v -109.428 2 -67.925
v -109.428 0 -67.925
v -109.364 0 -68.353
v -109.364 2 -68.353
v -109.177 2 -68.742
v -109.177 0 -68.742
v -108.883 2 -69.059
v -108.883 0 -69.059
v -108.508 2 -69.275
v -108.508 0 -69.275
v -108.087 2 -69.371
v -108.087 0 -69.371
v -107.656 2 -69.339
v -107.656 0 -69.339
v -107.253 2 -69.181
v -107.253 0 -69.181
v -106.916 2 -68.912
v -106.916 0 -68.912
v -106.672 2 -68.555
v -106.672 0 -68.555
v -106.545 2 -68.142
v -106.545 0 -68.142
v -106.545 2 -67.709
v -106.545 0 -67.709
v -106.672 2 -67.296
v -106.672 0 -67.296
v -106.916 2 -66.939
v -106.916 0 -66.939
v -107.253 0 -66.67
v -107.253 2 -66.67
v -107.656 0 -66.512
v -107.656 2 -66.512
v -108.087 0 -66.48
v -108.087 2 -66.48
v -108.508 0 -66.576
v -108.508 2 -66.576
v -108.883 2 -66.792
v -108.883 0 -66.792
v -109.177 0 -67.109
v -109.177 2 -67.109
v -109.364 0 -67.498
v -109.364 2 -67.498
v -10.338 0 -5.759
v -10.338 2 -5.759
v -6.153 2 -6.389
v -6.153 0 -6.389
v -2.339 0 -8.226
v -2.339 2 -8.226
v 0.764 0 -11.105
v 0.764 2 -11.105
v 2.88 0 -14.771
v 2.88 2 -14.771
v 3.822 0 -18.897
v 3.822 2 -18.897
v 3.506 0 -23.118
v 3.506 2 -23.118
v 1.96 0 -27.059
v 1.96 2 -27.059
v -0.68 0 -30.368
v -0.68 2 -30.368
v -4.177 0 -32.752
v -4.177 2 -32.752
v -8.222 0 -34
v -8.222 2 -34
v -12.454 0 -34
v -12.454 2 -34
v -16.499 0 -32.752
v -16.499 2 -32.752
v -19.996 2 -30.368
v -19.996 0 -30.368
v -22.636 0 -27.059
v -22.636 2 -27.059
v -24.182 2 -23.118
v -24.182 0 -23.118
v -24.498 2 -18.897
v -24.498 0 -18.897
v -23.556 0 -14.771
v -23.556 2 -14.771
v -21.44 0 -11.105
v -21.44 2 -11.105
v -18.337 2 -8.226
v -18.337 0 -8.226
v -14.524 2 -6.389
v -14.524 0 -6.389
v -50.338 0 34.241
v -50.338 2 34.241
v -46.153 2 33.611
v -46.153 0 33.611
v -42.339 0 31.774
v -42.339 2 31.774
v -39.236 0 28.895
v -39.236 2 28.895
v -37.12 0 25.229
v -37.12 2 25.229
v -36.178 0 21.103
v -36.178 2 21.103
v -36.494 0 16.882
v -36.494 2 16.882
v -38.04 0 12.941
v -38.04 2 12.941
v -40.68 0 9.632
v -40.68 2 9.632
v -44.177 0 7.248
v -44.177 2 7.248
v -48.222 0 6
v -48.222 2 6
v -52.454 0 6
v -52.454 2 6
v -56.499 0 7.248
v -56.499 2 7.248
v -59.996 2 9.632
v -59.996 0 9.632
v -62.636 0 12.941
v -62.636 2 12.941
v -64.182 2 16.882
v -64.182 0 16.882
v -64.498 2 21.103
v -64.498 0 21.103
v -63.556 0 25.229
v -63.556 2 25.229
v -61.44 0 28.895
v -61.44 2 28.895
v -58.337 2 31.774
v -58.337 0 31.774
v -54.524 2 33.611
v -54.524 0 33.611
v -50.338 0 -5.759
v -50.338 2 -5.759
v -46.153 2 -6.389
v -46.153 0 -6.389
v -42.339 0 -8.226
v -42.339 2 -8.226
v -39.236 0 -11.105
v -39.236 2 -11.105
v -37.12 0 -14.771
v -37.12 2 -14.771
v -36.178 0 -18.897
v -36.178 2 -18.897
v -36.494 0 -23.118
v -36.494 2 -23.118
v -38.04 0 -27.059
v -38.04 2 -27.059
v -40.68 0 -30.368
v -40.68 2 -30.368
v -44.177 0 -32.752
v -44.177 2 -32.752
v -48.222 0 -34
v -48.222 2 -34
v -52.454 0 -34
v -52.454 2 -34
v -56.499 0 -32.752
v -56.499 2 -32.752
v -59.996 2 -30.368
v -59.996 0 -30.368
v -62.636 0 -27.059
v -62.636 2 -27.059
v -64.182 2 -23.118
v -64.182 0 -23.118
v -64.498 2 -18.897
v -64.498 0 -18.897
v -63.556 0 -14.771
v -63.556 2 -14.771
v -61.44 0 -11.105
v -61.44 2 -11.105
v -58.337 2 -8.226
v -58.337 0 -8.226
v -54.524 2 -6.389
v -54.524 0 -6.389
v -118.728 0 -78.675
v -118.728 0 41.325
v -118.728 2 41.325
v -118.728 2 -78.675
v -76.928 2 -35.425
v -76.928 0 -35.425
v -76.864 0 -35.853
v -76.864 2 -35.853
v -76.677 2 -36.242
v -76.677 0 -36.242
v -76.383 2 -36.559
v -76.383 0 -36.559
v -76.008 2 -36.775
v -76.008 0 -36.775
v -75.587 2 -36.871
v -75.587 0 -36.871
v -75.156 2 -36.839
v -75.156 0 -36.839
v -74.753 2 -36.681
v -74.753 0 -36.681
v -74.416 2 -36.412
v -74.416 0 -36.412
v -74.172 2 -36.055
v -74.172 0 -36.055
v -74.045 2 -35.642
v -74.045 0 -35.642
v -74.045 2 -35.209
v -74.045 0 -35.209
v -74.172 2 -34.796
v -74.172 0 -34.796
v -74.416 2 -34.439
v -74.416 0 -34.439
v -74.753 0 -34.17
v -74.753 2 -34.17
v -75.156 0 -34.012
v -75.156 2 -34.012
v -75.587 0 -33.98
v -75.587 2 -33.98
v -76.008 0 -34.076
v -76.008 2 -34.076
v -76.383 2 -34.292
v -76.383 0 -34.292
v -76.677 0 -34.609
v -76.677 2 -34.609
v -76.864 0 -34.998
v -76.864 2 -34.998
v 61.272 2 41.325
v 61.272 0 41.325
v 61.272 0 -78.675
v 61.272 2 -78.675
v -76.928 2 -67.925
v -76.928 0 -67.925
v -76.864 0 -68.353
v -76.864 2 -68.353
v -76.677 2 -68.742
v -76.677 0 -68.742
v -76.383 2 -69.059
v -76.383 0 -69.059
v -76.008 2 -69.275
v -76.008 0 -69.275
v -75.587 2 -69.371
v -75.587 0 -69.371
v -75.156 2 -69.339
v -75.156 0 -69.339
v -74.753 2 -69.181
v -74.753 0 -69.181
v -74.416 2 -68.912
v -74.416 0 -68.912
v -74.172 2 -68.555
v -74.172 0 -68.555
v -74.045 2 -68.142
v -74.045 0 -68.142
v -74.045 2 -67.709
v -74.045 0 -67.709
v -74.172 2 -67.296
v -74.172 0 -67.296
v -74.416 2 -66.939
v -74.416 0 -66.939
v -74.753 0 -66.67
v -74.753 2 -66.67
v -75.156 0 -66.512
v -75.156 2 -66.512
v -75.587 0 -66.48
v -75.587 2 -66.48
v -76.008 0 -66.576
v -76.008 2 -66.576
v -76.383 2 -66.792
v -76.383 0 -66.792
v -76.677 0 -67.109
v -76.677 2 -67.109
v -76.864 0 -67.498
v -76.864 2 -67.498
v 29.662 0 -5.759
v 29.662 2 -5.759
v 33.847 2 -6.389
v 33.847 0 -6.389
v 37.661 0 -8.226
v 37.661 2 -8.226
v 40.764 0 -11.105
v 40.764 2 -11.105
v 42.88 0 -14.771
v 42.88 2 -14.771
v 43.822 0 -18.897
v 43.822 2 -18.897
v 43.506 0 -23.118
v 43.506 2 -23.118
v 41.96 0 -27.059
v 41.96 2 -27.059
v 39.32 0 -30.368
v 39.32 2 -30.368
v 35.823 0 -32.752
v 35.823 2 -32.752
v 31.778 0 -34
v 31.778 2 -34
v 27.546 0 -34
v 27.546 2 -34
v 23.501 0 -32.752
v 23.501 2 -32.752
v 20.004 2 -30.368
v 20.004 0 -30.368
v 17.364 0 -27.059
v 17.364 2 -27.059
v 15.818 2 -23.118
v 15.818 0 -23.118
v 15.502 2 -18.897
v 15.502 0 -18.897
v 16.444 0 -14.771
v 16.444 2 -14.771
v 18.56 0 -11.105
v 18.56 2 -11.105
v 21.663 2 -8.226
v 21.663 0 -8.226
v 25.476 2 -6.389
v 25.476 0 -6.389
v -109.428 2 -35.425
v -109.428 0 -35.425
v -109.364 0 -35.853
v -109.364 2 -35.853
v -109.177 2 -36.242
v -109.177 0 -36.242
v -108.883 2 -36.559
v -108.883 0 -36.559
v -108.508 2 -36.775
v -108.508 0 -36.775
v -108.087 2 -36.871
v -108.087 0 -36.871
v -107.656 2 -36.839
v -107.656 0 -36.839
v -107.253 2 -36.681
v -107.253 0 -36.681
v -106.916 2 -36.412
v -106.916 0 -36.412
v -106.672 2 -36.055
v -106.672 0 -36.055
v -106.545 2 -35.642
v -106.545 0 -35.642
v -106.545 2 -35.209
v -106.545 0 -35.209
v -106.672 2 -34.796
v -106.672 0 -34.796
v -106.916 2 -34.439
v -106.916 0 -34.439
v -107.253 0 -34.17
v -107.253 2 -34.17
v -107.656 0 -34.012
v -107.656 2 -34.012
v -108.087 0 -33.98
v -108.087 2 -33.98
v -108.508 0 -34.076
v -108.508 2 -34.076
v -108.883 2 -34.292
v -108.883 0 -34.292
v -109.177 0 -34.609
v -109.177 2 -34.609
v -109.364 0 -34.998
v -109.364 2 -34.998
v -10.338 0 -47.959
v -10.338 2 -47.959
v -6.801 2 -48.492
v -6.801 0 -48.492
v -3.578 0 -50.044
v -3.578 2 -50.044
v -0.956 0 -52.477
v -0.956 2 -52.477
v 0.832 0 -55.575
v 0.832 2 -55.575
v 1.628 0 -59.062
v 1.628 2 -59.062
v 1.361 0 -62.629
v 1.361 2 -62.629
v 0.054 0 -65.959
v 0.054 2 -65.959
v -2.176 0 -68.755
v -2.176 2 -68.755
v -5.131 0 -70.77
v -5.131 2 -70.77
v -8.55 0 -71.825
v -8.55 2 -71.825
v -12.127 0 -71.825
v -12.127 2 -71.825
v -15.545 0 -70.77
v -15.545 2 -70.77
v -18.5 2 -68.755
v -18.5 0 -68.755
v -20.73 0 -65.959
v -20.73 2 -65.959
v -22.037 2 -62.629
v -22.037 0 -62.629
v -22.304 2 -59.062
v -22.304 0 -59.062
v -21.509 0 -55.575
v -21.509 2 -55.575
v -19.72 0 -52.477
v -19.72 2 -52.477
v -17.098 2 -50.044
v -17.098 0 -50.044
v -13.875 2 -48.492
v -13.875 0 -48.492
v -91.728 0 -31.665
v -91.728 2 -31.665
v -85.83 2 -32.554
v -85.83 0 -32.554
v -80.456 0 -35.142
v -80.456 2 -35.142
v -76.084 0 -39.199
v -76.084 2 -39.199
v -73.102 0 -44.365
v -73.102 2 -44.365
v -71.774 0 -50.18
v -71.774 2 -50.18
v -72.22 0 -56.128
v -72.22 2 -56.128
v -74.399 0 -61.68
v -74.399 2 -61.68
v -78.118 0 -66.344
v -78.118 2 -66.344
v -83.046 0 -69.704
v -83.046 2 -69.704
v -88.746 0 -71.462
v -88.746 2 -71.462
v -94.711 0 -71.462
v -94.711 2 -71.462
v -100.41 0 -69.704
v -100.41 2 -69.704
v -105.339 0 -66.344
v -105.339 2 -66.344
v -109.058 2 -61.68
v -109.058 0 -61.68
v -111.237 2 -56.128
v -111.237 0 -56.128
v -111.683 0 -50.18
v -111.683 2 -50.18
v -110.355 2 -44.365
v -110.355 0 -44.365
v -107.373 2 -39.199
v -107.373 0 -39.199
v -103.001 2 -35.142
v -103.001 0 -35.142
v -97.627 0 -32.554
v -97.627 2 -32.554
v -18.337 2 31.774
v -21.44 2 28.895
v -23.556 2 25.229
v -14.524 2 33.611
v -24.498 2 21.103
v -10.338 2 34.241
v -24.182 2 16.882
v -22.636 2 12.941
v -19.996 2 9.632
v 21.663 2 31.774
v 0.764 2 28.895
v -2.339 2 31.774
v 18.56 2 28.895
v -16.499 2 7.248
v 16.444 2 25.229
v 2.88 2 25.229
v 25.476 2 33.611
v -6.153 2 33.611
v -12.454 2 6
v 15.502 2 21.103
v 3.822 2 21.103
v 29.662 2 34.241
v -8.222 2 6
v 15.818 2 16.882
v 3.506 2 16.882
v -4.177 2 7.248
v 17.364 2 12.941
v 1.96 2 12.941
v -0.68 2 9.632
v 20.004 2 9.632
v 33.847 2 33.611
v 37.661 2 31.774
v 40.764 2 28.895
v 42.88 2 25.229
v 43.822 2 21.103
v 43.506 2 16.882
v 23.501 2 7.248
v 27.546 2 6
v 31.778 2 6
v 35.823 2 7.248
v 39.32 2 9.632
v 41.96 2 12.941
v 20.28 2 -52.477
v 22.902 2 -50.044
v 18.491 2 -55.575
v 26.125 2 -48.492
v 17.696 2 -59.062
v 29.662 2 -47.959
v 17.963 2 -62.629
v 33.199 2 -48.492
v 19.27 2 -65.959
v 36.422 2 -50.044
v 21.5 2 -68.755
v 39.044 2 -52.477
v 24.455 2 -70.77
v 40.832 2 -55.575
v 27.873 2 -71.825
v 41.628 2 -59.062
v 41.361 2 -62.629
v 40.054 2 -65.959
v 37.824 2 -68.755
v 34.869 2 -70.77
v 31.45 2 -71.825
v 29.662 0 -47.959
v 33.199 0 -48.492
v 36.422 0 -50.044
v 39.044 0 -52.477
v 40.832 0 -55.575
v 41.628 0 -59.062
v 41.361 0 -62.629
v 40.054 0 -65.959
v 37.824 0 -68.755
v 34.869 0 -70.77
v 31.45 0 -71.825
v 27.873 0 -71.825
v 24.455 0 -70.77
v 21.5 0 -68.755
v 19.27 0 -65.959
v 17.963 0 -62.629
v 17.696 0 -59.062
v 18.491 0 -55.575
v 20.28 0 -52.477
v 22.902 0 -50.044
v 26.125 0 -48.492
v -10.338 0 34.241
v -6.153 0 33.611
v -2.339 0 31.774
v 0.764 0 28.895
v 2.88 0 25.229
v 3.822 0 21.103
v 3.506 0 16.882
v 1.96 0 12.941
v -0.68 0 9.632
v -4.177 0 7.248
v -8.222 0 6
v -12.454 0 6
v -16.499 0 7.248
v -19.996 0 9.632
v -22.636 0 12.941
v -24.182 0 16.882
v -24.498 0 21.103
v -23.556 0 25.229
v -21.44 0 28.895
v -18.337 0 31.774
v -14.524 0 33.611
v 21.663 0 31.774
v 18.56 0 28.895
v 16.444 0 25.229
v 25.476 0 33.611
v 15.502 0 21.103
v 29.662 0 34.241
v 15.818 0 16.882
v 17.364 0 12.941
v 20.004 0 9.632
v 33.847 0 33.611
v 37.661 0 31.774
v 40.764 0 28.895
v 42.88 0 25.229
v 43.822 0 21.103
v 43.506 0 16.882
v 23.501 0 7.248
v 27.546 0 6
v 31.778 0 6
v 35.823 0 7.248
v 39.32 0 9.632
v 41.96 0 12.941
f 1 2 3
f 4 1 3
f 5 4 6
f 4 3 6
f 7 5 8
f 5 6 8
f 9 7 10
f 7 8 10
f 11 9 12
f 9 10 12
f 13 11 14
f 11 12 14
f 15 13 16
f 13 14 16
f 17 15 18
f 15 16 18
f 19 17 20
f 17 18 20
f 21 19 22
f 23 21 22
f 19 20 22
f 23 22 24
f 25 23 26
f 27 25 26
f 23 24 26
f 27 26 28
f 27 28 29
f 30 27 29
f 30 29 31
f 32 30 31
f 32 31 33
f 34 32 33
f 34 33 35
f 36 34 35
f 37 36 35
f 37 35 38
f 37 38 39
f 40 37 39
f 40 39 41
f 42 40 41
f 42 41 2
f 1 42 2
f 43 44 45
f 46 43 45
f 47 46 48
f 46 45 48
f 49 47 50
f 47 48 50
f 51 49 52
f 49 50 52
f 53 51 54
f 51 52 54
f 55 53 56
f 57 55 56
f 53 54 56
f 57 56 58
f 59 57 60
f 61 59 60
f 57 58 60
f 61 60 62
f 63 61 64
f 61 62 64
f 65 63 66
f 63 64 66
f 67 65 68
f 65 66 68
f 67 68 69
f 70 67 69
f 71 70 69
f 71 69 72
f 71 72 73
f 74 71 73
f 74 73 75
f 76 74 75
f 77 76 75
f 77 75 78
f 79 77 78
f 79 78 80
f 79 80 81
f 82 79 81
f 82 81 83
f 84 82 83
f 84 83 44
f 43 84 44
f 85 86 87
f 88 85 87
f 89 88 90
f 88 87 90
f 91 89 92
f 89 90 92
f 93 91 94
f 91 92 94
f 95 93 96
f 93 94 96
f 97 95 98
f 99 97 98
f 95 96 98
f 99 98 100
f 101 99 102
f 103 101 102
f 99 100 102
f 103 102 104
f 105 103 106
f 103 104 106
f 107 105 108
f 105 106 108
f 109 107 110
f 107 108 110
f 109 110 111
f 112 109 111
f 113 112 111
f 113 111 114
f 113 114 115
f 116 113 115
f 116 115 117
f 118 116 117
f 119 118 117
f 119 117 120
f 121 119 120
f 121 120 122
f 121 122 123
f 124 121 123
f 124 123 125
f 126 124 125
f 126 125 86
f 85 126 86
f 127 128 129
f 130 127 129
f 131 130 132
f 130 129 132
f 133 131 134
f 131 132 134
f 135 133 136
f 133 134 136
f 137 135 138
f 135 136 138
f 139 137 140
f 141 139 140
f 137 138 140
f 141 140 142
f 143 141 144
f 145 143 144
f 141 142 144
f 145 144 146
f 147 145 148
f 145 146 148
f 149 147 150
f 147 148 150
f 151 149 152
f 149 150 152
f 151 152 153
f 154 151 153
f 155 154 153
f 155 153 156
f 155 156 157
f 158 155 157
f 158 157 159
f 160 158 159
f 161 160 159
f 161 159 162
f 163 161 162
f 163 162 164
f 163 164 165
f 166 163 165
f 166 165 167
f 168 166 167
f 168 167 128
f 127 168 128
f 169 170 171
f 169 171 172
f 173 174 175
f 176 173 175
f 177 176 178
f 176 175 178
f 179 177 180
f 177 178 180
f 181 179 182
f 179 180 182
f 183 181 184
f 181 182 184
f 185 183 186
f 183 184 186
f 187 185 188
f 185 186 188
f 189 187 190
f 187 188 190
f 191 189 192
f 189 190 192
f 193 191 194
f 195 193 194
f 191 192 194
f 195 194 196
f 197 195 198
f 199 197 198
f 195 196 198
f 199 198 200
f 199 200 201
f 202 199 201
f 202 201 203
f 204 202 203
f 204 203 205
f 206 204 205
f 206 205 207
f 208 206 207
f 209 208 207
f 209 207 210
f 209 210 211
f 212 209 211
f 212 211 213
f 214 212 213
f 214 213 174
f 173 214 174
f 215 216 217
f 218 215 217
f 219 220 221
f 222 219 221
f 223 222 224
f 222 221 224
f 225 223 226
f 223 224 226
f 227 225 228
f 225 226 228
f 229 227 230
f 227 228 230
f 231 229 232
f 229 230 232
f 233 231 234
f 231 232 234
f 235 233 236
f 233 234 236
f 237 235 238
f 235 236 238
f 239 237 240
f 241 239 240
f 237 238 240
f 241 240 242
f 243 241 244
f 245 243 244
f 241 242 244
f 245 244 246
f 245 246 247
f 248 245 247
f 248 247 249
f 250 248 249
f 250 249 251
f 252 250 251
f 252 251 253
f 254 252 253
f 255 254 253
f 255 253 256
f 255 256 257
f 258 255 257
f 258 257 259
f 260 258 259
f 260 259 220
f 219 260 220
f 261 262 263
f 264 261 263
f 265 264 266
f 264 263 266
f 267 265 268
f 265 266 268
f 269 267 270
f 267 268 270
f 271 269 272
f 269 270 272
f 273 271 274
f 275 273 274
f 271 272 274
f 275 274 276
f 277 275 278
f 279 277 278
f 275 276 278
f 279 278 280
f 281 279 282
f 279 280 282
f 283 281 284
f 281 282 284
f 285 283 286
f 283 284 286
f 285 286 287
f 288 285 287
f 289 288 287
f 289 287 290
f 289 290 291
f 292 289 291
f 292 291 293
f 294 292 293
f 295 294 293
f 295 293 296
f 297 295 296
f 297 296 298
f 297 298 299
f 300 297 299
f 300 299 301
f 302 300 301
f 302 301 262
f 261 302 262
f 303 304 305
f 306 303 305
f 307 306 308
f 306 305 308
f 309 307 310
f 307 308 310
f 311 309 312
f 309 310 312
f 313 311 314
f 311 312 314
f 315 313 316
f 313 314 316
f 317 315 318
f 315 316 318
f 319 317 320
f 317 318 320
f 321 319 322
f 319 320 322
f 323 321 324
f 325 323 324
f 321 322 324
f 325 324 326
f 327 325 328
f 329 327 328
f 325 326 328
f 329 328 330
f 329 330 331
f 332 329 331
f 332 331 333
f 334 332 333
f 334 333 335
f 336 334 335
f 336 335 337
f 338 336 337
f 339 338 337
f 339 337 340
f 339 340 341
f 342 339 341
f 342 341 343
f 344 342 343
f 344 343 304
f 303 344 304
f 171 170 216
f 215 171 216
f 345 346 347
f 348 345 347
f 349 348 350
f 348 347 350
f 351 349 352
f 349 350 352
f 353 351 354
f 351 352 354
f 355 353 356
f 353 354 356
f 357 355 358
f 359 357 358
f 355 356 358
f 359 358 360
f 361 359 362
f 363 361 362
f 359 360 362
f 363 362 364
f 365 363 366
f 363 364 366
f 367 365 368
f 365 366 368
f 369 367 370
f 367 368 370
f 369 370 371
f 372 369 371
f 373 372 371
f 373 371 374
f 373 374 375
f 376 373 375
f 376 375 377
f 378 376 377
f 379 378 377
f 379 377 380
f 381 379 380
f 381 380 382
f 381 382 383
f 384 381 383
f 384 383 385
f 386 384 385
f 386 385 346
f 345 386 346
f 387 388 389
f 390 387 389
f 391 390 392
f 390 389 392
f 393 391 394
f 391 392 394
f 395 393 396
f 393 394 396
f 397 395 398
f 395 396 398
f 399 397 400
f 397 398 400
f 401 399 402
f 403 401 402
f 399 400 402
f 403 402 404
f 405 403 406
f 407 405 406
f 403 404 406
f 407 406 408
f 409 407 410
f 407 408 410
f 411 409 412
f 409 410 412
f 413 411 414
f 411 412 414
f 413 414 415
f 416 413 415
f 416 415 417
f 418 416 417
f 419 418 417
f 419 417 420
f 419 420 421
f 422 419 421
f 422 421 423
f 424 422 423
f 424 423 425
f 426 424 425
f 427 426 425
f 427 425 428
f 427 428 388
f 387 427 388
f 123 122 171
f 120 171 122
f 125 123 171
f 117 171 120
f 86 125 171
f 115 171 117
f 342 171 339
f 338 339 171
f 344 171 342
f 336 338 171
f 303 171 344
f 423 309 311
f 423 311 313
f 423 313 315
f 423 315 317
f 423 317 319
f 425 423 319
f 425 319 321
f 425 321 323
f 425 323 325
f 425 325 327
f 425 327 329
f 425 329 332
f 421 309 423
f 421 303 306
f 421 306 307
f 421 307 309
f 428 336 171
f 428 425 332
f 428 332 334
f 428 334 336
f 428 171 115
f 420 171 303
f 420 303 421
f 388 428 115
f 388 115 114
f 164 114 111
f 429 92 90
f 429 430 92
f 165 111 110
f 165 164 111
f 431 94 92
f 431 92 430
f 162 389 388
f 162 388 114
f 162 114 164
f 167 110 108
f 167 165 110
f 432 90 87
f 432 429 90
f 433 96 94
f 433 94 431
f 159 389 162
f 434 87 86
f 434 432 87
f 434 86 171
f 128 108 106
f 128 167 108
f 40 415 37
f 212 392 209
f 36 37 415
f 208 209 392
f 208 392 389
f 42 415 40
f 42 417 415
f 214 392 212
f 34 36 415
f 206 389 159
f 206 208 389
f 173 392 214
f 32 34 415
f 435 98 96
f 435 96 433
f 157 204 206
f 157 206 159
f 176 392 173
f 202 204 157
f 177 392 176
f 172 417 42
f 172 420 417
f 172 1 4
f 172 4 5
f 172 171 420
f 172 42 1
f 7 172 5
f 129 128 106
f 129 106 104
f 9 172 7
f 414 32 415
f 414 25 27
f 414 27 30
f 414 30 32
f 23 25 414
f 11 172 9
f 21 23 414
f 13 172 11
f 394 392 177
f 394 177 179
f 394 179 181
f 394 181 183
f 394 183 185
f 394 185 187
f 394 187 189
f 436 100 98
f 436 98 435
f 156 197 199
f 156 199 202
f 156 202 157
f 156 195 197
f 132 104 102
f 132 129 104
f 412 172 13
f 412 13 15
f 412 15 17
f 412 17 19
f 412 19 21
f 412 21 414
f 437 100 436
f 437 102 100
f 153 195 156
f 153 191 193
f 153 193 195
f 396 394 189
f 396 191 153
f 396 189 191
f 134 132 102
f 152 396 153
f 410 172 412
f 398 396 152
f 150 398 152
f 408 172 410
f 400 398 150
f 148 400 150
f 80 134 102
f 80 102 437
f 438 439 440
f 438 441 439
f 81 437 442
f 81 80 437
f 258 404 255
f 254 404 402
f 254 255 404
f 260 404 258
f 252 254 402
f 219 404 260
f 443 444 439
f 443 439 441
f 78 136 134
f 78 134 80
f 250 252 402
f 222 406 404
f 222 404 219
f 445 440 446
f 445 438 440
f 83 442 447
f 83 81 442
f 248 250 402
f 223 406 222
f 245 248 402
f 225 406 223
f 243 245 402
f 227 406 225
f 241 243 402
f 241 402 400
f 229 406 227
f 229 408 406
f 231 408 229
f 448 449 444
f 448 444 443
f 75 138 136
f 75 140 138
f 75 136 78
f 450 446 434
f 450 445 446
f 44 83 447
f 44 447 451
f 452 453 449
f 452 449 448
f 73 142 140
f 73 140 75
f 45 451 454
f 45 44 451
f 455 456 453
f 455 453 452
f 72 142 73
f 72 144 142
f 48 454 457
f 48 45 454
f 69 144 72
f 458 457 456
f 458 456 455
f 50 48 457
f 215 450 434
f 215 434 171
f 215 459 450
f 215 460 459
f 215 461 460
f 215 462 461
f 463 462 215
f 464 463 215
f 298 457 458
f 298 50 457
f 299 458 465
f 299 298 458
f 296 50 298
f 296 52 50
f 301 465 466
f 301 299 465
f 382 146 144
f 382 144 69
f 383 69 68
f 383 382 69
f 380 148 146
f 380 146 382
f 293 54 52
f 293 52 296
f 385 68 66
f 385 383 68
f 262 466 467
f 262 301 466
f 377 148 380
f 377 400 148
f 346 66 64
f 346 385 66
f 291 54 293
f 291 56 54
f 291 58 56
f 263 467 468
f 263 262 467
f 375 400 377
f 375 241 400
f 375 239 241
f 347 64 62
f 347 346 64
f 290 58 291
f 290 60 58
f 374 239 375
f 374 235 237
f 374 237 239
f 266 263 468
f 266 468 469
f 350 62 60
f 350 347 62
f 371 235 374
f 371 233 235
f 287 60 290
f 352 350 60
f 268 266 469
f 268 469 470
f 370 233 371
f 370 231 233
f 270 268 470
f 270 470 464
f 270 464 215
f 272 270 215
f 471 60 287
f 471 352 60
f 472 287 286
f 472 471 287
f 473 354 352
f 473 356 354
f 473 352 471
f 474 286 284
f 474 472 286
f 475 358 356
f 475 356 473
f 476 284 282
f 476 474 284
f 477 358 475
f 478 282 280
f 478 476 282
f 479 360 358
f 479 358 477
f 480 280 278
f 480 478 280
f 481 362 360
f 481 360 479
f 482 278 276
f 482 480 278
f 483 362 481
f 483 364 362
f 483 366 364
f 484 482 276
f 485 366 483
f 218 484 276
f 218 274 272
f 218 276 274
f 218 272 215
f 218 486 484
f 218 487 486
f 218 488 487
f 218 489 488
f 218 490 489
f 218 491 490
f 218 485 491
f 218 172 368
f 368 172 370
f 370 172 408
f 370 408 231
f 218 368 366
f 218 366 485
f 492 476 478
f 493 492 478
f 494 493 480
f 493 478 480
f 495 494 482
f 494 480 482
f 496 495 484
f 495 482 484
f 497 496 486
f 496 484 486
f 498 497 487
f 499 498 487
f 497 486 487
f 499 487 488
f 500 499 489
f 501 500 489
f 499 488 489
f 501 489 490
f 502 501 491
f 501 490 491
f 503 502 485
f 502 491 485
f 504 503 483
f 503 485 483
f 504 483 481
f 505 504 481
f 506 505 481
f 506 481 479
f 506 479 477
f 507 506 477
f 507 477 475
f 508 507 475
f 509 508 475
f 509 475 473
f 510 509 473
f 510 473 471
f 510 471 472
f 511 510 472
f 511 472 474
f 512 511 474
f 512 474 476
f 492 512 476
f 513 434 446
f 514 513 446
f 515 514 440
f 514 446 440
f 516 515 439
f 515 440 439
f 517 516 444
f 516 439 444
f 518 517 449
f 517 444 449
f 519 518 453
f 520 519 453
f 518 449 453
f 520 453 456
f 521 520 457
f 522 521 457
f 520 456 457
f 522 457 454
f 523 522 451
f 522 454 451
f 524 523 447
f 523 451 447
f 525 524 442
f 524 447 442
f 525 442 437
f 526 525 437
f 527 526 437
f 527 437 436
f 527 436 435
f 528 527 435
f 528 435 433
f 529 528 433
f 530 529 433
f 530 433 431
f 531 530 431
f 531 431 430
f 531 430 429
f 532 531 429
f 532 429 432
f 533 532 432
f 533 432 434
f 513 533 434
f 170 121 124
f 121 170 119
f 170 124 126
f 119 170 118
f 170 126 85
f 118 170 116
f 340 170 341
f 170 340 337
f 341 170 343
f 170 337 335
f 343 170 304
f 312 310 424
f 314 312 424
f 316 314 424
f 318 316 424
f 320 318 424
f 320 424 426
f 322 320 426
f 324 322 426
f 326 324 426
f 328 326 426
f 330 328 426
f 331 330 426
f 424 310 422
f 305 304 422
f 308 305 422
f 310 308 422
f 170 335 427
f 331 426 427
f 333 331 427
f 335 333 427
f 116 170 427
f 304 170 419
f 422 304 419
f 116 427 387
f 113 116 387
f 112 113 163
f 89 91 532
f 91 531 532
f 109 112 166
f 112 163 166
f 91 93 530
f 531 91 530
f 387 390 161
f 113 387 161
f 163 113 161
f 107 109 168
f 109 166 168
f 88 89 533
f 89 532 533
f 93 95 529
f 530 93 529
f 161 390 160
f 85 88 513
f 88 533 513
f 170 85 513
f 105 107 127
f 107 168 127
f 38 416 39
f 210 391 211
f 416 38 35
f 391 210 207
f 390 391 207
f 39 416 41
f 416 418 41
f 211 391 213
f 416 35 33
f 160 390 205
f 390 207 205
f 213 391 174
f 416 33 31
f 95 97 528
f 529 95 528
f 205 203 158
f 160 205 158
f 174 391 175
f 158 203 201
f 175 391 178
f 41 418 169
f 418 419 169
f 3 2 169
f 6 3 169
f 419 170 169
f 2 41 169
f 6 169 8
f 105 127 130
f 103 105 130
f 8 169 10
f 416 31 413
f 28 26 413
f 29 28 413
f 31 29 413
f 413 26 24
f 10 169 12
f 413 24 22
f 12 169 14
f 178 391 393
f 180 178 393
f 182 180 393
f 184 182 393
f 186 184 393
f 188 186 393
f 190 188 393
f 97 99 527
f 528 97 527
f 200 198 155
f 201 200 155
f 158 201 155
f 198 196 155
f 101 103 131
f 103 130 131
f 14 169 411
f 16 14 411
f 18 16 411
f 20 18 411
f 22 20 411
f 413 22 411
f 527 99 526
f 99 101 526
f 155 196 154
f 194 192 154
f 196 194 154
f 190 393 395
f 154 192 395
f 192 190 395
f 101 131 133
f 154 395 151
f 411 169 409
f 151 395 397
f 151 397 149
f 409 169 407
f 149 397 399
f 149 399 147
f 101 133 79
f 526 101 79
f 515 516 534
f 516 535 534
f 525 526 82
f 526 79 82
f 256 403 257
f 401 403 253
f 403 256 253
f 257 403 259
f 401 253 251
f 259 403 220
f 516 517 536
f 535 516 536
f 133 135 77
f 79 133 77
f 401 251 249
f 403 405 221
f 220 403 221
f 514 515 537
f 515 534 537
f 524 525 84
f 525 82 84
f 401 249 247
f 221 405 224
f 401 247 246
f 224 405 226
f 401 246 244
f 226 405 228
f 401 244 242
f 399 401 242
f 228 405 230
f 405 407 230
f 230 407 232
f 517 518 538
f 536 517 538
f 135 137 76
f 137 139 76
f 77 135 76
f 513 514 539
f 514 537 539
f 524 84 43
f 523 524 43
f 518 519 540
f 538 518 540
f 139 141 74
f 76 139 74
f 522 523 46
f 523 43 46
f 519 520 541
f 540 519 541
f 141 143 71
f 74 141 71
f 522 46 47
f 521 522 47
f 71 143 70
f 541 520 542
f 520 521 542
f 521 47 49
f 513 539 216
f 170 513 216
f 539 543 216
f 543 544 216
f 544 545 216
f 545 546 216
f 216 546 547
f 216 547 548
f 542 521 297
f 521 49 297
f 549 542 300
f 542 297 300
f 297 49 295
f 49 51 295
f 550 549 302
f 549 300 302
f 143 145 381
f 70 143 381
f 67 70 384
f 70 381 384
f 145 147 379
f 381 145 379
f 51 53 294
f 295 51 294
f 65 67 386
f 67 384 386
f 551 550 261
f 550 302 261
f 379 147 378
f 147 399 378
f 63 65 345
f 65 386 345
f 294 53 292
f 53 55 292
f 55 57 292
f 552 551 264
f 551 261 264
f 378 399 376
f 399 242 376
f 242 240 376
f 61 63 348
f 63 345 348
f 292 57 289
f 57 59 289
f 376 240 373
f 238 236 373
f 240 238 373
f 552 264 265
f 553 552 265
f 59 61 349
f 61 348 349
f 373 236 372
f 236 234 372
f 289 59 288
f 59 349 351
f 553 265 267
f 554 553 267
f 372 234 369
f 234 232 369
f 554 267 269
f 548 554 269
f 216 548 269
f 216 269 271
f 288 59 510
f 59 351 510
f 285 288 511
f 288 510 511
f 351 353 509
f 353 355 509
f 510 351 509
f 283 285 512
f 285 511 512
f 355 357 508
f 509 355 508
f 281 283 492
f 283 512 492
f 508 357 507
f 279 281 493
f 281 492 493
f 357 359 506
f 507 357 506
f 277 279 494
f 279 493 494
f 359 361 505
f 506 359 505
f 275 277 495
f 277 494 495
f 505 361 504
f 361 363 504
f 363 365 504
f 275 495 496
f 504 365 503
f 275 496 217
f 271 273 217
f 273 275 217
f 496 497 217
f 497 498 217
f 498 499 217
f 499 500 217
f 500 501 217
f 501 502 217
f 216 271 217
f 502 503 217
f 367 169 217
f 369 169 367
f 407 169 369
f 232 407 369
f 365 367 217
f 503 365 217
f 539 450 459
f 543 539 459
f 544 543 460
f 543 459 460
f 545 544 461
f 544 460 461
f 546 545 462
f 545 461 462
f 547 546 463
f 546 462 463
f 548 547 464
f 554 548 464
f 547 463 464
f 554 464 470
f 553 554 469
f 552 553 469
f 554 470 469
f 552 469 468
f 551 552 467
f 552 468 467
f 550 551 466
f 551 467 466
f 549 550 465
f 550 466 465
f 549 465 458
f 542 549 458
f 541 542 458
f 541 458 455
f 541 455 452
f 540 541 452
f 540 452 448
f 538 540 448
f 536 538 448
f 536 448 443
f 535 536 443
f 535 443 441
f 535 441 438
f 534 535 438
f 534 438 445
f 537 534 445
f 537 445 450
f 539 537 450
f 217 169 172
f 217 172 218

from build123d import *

# Parameters (mm, degrees)
SKETCH1_W              = 180
SKETCH1_H              = 120
BOSS_EXTRUDE1_DEPTH    = 2
BUTTON_HOLES_CUT_REACH = 144.444
SKETCH2_R              = 14.2
SKETCH2_R_2            = 12
SKETCH2_R_3            = 20.01
M2_5_CLEARANCE_HOLE1_D = 2.9


with BuildPart() as part:
    # Sketch1 → Boss-Extrude1 (new body)
    with BuildSketch(Plane(origin=(0, 0, 0), x_dir=(1, 0, 0), z_dir=(0, 1, 0))):
        with Locations((-28.728476821, 18.675496689)):
            Rectangle(SKETCH1_W, SKETCH1_H)
    extrude(amount=BOSS_EXTRUDE1_DEPTH)

    # Sketch2 → button_holes_cut (cut, up to next)
    with BuildSketch(Plane(origin=(0, 2, 0), x_dir=(1, 0, 0), z_dir=(0, 1, 0)), mode=Mode.PRIVATE) as button_holes_cut_sk1:
        with Locations(Location((-50.338026535, -20.041382951, 0), (0, 0, 270))):
            Circle(SKETCH2_R)
    button_holes_cut_tool1 = extrude(button_holes_cut_sk1.sketch, amount=-BUTTON_HOLES_CUT_REACH, mode=Mode.PRIVATE) & part.part
    # Sketch2 → button_holes_cut (cut, up to next)
    with BuildSketch(Plane(origin=(0, 2, 0), x_dir=(1, 0, 0), z_dir=(0, 1, 0)), mode=Mode.PRIVATE) as button_holes_cut_sk2:
        with Locations(Location((29.661973465, 59.958617049, 0), (0, 0, 270))):
            Circle(SKETCH2_R_2)
    button_holes_cut_tool2 = extrude(button_holes_cut_sk2.sketch, amount=-BUTTON_HOLES_CUT_REACH, mode=Mode.PRIVATE) & part.part
    # Sketch2 → button_holes_cut (cut, up to next)
    with BuildSketch(Plane(origin=(0, 2, 0), x_dir=(1, 0, 0), z_dir=(0, 1, 0)), mode=Mode.PRIVATE) as button_holes_cut_sk3:
        with Locations(Location((-10.338026535, 59.958617049, 0), (0, 0, 270))):
            Circle(SKETCH2_R_2)
    button_holes_cut_tool3 = extrude(button_holes_cut_sk3.sketch, amount=-BUTTON_HOLES_CUT_REACH, mode=Mode.PRIVATE) & part.part
    # Sketch2 → button_holes_cut (cut, up to next)
    with BuildSketch(Plane(origin=(0, 2, 0), x_dir=(1, 0, 0), z_dir=(0, 1, 0)), mode=Mode.PRIVATE) as button_holes_cut_sk4:
        with Locations(Location((-10.338026535, -20.041382951, 0), (0, 0, 270))):
            Circle(SKETCH2_R)
    button_holes_cut_tool4 = extrude(button_holes_cut_sk4.sketch, amount=-BUTTON_HOLES_CUT_REACH, mode=Mode.PRIVATE) & part.part
    # Sketch2 → button_holes_cut (cut, up to next)
    with BuildSketch(Plane(origin=(0, 2, 0), x_dir=(1, 0, 0), z_dir=(0, 1, 0)), mode=Mode.PRIVATE) as button_holes_cut_sk5:
        with Locations(Location((29.661973465, -20.041382951, 0), (0, 0, 270))):
            Circle(SKETCH2_R)
    button_holes_cut_tool5 = extrude(button_holes_cut_sk5.sketch, amount=-BUTTON_HOLES_CUT_REACH, mode=Mode.PRIVATE) & part.part
    # Sketch2 → button_holes_cut (cut, up to next)
    with BuildSketch(Plane(origin=(0, 2, 0), x_dir=(1, 0, 0), z_dir=(0, 1, 0)), mode=Mode.PRIVATE) as button_holes_cut_sk6:
        with Locations(Location((-50.338026535, 19.958617049, 0), (0, 0, 270))):
            Circle(SKETCH2_R)
    button_holes_cut_tool6 = extrude(button_holes_cut_sk6.sketch, amount=-BUTTON_HOLES_CUT_REACH, mode=Mode.PRIVATE) & part.part
    # Sketch2 → button_holes_cut (cut, up to next)
    with BuildSketch(Plane(origin=(0, 2, 0), x_dir=(1, 0, 0), z_dir=(0, 1, 0)), mode=Mode.PRIVATE) as button_holes_cut_sk7:
        with Locations(Location((-10.338026535, 19.958617049, 0), (0, 0, 270))):
            Circle(SKETCH2_R)
    button_holes_cut_tool7 = extrude(button_holes_cut_sk7.sketch, amount=-BUTTON_HOLES_CUT_REACH, mode=Mode.PRIVATE) & part.part
    # Sketch2 → button_holes_cut (cut, up to next)
    with BuildSketch(Plane(origin=(0, 2, 0), x_dir=(1, 0, 0), z_dir=(0, 1, 0)), mode=Mode.PRIVATE) as button_holes_cut_sk8:
        with Locations(Location((29.661973465, 19.958617049, 0), (0, 0, 270))):
            Circle(SKETCH2_R)
    button_holes_cut_tool8 = extrude(button_holes_cut_sk8.sketch, amount=-BUTTON_HOLES_CUT_REACH, mode=Mode.PRIVATE) & part.part
    # Sketch2 → button_holes_cut (cut, up to next)
    with BuildSketch(Plane(origin=(0, 2, 0), x_dir=(1, 0, 0), z_dir=(0, 1, 0)), mode=Mode.PRIVATE) as button_holes_cut_sk9:
        with Locations(Location((-91.728476821, 51.675496689, 0), (0, 0, 270))):
            Circle(SKETCH2_R_3)
    button_holes_cut_tool9 = extrude(button_holes_cut_sk9.sketch, amount=-BUTTON_HOLES_CUT_REACH, mode=Mode.PRIVATE) & part.part
    add(button_holes_cut_tool1.solids().sort_by_distance((-50.338027, 2, 20.041383))[0], mode=Mode.SUBTRACT)
    add(button_holes_cut_tool2.solids().sort_by_distance((29.661973, 2, -59.958617))[0], mode=Mode.SUBTRACT)
    add(button_holes_cut_tool3.solids().sort_by_distance((-10.338027, 2, -59.958617))[0], mode=Mode.SUBTRACT)
    add(button_holes_cut_tool4.solids().sort_by_distance((-10.338027, 2, 20.041383))[0], mode=Mode.SUBTRACT)
    add(button_holes_cut_tool5.solids().sort_by_distance((29.661973, 2, 20.041383))[0], mode=Mode.SUBTRACT)
    add(button_holes_cut_tool6.solids().sort_by_distance((-50.338027, 2, -19.958617))[0], mode=Mode.SUBTRACT)
    add(button_holes_cut_tool7.solids().sort_by_distance((-10.338027, 2, -19.958617))[0], mode=Mode.SUBTRACT)
    add(button_holes_cut_tool8.solids().sort_by_distance((29.661973, 2, -19.958617))[0], mode=Mode.SUBTRACT)
    add(button_holes_cut_tool9.solids().sort_by_distance((-91.728477, 2, -51.675497))[0], mode=Mode.SUBTRACT)

    # M2.5 Clearance Hole1 (through all)
    with Locations(Plane(origin=(0, 2, 0), x_dir=(1, 0, 0), z_dir=(0, 1, 0))):
        with Locations((-91.728476821, 51.675496689), (-75.478476821, 67.925496689), (-107.978476821, 67.925496689), (-75.478476821, 35.425496689), (-107.978476821, 35.425496689)):
            Hole(M2_5_CLEARANCE_HOLE1_D / 2)


solid = part.part
